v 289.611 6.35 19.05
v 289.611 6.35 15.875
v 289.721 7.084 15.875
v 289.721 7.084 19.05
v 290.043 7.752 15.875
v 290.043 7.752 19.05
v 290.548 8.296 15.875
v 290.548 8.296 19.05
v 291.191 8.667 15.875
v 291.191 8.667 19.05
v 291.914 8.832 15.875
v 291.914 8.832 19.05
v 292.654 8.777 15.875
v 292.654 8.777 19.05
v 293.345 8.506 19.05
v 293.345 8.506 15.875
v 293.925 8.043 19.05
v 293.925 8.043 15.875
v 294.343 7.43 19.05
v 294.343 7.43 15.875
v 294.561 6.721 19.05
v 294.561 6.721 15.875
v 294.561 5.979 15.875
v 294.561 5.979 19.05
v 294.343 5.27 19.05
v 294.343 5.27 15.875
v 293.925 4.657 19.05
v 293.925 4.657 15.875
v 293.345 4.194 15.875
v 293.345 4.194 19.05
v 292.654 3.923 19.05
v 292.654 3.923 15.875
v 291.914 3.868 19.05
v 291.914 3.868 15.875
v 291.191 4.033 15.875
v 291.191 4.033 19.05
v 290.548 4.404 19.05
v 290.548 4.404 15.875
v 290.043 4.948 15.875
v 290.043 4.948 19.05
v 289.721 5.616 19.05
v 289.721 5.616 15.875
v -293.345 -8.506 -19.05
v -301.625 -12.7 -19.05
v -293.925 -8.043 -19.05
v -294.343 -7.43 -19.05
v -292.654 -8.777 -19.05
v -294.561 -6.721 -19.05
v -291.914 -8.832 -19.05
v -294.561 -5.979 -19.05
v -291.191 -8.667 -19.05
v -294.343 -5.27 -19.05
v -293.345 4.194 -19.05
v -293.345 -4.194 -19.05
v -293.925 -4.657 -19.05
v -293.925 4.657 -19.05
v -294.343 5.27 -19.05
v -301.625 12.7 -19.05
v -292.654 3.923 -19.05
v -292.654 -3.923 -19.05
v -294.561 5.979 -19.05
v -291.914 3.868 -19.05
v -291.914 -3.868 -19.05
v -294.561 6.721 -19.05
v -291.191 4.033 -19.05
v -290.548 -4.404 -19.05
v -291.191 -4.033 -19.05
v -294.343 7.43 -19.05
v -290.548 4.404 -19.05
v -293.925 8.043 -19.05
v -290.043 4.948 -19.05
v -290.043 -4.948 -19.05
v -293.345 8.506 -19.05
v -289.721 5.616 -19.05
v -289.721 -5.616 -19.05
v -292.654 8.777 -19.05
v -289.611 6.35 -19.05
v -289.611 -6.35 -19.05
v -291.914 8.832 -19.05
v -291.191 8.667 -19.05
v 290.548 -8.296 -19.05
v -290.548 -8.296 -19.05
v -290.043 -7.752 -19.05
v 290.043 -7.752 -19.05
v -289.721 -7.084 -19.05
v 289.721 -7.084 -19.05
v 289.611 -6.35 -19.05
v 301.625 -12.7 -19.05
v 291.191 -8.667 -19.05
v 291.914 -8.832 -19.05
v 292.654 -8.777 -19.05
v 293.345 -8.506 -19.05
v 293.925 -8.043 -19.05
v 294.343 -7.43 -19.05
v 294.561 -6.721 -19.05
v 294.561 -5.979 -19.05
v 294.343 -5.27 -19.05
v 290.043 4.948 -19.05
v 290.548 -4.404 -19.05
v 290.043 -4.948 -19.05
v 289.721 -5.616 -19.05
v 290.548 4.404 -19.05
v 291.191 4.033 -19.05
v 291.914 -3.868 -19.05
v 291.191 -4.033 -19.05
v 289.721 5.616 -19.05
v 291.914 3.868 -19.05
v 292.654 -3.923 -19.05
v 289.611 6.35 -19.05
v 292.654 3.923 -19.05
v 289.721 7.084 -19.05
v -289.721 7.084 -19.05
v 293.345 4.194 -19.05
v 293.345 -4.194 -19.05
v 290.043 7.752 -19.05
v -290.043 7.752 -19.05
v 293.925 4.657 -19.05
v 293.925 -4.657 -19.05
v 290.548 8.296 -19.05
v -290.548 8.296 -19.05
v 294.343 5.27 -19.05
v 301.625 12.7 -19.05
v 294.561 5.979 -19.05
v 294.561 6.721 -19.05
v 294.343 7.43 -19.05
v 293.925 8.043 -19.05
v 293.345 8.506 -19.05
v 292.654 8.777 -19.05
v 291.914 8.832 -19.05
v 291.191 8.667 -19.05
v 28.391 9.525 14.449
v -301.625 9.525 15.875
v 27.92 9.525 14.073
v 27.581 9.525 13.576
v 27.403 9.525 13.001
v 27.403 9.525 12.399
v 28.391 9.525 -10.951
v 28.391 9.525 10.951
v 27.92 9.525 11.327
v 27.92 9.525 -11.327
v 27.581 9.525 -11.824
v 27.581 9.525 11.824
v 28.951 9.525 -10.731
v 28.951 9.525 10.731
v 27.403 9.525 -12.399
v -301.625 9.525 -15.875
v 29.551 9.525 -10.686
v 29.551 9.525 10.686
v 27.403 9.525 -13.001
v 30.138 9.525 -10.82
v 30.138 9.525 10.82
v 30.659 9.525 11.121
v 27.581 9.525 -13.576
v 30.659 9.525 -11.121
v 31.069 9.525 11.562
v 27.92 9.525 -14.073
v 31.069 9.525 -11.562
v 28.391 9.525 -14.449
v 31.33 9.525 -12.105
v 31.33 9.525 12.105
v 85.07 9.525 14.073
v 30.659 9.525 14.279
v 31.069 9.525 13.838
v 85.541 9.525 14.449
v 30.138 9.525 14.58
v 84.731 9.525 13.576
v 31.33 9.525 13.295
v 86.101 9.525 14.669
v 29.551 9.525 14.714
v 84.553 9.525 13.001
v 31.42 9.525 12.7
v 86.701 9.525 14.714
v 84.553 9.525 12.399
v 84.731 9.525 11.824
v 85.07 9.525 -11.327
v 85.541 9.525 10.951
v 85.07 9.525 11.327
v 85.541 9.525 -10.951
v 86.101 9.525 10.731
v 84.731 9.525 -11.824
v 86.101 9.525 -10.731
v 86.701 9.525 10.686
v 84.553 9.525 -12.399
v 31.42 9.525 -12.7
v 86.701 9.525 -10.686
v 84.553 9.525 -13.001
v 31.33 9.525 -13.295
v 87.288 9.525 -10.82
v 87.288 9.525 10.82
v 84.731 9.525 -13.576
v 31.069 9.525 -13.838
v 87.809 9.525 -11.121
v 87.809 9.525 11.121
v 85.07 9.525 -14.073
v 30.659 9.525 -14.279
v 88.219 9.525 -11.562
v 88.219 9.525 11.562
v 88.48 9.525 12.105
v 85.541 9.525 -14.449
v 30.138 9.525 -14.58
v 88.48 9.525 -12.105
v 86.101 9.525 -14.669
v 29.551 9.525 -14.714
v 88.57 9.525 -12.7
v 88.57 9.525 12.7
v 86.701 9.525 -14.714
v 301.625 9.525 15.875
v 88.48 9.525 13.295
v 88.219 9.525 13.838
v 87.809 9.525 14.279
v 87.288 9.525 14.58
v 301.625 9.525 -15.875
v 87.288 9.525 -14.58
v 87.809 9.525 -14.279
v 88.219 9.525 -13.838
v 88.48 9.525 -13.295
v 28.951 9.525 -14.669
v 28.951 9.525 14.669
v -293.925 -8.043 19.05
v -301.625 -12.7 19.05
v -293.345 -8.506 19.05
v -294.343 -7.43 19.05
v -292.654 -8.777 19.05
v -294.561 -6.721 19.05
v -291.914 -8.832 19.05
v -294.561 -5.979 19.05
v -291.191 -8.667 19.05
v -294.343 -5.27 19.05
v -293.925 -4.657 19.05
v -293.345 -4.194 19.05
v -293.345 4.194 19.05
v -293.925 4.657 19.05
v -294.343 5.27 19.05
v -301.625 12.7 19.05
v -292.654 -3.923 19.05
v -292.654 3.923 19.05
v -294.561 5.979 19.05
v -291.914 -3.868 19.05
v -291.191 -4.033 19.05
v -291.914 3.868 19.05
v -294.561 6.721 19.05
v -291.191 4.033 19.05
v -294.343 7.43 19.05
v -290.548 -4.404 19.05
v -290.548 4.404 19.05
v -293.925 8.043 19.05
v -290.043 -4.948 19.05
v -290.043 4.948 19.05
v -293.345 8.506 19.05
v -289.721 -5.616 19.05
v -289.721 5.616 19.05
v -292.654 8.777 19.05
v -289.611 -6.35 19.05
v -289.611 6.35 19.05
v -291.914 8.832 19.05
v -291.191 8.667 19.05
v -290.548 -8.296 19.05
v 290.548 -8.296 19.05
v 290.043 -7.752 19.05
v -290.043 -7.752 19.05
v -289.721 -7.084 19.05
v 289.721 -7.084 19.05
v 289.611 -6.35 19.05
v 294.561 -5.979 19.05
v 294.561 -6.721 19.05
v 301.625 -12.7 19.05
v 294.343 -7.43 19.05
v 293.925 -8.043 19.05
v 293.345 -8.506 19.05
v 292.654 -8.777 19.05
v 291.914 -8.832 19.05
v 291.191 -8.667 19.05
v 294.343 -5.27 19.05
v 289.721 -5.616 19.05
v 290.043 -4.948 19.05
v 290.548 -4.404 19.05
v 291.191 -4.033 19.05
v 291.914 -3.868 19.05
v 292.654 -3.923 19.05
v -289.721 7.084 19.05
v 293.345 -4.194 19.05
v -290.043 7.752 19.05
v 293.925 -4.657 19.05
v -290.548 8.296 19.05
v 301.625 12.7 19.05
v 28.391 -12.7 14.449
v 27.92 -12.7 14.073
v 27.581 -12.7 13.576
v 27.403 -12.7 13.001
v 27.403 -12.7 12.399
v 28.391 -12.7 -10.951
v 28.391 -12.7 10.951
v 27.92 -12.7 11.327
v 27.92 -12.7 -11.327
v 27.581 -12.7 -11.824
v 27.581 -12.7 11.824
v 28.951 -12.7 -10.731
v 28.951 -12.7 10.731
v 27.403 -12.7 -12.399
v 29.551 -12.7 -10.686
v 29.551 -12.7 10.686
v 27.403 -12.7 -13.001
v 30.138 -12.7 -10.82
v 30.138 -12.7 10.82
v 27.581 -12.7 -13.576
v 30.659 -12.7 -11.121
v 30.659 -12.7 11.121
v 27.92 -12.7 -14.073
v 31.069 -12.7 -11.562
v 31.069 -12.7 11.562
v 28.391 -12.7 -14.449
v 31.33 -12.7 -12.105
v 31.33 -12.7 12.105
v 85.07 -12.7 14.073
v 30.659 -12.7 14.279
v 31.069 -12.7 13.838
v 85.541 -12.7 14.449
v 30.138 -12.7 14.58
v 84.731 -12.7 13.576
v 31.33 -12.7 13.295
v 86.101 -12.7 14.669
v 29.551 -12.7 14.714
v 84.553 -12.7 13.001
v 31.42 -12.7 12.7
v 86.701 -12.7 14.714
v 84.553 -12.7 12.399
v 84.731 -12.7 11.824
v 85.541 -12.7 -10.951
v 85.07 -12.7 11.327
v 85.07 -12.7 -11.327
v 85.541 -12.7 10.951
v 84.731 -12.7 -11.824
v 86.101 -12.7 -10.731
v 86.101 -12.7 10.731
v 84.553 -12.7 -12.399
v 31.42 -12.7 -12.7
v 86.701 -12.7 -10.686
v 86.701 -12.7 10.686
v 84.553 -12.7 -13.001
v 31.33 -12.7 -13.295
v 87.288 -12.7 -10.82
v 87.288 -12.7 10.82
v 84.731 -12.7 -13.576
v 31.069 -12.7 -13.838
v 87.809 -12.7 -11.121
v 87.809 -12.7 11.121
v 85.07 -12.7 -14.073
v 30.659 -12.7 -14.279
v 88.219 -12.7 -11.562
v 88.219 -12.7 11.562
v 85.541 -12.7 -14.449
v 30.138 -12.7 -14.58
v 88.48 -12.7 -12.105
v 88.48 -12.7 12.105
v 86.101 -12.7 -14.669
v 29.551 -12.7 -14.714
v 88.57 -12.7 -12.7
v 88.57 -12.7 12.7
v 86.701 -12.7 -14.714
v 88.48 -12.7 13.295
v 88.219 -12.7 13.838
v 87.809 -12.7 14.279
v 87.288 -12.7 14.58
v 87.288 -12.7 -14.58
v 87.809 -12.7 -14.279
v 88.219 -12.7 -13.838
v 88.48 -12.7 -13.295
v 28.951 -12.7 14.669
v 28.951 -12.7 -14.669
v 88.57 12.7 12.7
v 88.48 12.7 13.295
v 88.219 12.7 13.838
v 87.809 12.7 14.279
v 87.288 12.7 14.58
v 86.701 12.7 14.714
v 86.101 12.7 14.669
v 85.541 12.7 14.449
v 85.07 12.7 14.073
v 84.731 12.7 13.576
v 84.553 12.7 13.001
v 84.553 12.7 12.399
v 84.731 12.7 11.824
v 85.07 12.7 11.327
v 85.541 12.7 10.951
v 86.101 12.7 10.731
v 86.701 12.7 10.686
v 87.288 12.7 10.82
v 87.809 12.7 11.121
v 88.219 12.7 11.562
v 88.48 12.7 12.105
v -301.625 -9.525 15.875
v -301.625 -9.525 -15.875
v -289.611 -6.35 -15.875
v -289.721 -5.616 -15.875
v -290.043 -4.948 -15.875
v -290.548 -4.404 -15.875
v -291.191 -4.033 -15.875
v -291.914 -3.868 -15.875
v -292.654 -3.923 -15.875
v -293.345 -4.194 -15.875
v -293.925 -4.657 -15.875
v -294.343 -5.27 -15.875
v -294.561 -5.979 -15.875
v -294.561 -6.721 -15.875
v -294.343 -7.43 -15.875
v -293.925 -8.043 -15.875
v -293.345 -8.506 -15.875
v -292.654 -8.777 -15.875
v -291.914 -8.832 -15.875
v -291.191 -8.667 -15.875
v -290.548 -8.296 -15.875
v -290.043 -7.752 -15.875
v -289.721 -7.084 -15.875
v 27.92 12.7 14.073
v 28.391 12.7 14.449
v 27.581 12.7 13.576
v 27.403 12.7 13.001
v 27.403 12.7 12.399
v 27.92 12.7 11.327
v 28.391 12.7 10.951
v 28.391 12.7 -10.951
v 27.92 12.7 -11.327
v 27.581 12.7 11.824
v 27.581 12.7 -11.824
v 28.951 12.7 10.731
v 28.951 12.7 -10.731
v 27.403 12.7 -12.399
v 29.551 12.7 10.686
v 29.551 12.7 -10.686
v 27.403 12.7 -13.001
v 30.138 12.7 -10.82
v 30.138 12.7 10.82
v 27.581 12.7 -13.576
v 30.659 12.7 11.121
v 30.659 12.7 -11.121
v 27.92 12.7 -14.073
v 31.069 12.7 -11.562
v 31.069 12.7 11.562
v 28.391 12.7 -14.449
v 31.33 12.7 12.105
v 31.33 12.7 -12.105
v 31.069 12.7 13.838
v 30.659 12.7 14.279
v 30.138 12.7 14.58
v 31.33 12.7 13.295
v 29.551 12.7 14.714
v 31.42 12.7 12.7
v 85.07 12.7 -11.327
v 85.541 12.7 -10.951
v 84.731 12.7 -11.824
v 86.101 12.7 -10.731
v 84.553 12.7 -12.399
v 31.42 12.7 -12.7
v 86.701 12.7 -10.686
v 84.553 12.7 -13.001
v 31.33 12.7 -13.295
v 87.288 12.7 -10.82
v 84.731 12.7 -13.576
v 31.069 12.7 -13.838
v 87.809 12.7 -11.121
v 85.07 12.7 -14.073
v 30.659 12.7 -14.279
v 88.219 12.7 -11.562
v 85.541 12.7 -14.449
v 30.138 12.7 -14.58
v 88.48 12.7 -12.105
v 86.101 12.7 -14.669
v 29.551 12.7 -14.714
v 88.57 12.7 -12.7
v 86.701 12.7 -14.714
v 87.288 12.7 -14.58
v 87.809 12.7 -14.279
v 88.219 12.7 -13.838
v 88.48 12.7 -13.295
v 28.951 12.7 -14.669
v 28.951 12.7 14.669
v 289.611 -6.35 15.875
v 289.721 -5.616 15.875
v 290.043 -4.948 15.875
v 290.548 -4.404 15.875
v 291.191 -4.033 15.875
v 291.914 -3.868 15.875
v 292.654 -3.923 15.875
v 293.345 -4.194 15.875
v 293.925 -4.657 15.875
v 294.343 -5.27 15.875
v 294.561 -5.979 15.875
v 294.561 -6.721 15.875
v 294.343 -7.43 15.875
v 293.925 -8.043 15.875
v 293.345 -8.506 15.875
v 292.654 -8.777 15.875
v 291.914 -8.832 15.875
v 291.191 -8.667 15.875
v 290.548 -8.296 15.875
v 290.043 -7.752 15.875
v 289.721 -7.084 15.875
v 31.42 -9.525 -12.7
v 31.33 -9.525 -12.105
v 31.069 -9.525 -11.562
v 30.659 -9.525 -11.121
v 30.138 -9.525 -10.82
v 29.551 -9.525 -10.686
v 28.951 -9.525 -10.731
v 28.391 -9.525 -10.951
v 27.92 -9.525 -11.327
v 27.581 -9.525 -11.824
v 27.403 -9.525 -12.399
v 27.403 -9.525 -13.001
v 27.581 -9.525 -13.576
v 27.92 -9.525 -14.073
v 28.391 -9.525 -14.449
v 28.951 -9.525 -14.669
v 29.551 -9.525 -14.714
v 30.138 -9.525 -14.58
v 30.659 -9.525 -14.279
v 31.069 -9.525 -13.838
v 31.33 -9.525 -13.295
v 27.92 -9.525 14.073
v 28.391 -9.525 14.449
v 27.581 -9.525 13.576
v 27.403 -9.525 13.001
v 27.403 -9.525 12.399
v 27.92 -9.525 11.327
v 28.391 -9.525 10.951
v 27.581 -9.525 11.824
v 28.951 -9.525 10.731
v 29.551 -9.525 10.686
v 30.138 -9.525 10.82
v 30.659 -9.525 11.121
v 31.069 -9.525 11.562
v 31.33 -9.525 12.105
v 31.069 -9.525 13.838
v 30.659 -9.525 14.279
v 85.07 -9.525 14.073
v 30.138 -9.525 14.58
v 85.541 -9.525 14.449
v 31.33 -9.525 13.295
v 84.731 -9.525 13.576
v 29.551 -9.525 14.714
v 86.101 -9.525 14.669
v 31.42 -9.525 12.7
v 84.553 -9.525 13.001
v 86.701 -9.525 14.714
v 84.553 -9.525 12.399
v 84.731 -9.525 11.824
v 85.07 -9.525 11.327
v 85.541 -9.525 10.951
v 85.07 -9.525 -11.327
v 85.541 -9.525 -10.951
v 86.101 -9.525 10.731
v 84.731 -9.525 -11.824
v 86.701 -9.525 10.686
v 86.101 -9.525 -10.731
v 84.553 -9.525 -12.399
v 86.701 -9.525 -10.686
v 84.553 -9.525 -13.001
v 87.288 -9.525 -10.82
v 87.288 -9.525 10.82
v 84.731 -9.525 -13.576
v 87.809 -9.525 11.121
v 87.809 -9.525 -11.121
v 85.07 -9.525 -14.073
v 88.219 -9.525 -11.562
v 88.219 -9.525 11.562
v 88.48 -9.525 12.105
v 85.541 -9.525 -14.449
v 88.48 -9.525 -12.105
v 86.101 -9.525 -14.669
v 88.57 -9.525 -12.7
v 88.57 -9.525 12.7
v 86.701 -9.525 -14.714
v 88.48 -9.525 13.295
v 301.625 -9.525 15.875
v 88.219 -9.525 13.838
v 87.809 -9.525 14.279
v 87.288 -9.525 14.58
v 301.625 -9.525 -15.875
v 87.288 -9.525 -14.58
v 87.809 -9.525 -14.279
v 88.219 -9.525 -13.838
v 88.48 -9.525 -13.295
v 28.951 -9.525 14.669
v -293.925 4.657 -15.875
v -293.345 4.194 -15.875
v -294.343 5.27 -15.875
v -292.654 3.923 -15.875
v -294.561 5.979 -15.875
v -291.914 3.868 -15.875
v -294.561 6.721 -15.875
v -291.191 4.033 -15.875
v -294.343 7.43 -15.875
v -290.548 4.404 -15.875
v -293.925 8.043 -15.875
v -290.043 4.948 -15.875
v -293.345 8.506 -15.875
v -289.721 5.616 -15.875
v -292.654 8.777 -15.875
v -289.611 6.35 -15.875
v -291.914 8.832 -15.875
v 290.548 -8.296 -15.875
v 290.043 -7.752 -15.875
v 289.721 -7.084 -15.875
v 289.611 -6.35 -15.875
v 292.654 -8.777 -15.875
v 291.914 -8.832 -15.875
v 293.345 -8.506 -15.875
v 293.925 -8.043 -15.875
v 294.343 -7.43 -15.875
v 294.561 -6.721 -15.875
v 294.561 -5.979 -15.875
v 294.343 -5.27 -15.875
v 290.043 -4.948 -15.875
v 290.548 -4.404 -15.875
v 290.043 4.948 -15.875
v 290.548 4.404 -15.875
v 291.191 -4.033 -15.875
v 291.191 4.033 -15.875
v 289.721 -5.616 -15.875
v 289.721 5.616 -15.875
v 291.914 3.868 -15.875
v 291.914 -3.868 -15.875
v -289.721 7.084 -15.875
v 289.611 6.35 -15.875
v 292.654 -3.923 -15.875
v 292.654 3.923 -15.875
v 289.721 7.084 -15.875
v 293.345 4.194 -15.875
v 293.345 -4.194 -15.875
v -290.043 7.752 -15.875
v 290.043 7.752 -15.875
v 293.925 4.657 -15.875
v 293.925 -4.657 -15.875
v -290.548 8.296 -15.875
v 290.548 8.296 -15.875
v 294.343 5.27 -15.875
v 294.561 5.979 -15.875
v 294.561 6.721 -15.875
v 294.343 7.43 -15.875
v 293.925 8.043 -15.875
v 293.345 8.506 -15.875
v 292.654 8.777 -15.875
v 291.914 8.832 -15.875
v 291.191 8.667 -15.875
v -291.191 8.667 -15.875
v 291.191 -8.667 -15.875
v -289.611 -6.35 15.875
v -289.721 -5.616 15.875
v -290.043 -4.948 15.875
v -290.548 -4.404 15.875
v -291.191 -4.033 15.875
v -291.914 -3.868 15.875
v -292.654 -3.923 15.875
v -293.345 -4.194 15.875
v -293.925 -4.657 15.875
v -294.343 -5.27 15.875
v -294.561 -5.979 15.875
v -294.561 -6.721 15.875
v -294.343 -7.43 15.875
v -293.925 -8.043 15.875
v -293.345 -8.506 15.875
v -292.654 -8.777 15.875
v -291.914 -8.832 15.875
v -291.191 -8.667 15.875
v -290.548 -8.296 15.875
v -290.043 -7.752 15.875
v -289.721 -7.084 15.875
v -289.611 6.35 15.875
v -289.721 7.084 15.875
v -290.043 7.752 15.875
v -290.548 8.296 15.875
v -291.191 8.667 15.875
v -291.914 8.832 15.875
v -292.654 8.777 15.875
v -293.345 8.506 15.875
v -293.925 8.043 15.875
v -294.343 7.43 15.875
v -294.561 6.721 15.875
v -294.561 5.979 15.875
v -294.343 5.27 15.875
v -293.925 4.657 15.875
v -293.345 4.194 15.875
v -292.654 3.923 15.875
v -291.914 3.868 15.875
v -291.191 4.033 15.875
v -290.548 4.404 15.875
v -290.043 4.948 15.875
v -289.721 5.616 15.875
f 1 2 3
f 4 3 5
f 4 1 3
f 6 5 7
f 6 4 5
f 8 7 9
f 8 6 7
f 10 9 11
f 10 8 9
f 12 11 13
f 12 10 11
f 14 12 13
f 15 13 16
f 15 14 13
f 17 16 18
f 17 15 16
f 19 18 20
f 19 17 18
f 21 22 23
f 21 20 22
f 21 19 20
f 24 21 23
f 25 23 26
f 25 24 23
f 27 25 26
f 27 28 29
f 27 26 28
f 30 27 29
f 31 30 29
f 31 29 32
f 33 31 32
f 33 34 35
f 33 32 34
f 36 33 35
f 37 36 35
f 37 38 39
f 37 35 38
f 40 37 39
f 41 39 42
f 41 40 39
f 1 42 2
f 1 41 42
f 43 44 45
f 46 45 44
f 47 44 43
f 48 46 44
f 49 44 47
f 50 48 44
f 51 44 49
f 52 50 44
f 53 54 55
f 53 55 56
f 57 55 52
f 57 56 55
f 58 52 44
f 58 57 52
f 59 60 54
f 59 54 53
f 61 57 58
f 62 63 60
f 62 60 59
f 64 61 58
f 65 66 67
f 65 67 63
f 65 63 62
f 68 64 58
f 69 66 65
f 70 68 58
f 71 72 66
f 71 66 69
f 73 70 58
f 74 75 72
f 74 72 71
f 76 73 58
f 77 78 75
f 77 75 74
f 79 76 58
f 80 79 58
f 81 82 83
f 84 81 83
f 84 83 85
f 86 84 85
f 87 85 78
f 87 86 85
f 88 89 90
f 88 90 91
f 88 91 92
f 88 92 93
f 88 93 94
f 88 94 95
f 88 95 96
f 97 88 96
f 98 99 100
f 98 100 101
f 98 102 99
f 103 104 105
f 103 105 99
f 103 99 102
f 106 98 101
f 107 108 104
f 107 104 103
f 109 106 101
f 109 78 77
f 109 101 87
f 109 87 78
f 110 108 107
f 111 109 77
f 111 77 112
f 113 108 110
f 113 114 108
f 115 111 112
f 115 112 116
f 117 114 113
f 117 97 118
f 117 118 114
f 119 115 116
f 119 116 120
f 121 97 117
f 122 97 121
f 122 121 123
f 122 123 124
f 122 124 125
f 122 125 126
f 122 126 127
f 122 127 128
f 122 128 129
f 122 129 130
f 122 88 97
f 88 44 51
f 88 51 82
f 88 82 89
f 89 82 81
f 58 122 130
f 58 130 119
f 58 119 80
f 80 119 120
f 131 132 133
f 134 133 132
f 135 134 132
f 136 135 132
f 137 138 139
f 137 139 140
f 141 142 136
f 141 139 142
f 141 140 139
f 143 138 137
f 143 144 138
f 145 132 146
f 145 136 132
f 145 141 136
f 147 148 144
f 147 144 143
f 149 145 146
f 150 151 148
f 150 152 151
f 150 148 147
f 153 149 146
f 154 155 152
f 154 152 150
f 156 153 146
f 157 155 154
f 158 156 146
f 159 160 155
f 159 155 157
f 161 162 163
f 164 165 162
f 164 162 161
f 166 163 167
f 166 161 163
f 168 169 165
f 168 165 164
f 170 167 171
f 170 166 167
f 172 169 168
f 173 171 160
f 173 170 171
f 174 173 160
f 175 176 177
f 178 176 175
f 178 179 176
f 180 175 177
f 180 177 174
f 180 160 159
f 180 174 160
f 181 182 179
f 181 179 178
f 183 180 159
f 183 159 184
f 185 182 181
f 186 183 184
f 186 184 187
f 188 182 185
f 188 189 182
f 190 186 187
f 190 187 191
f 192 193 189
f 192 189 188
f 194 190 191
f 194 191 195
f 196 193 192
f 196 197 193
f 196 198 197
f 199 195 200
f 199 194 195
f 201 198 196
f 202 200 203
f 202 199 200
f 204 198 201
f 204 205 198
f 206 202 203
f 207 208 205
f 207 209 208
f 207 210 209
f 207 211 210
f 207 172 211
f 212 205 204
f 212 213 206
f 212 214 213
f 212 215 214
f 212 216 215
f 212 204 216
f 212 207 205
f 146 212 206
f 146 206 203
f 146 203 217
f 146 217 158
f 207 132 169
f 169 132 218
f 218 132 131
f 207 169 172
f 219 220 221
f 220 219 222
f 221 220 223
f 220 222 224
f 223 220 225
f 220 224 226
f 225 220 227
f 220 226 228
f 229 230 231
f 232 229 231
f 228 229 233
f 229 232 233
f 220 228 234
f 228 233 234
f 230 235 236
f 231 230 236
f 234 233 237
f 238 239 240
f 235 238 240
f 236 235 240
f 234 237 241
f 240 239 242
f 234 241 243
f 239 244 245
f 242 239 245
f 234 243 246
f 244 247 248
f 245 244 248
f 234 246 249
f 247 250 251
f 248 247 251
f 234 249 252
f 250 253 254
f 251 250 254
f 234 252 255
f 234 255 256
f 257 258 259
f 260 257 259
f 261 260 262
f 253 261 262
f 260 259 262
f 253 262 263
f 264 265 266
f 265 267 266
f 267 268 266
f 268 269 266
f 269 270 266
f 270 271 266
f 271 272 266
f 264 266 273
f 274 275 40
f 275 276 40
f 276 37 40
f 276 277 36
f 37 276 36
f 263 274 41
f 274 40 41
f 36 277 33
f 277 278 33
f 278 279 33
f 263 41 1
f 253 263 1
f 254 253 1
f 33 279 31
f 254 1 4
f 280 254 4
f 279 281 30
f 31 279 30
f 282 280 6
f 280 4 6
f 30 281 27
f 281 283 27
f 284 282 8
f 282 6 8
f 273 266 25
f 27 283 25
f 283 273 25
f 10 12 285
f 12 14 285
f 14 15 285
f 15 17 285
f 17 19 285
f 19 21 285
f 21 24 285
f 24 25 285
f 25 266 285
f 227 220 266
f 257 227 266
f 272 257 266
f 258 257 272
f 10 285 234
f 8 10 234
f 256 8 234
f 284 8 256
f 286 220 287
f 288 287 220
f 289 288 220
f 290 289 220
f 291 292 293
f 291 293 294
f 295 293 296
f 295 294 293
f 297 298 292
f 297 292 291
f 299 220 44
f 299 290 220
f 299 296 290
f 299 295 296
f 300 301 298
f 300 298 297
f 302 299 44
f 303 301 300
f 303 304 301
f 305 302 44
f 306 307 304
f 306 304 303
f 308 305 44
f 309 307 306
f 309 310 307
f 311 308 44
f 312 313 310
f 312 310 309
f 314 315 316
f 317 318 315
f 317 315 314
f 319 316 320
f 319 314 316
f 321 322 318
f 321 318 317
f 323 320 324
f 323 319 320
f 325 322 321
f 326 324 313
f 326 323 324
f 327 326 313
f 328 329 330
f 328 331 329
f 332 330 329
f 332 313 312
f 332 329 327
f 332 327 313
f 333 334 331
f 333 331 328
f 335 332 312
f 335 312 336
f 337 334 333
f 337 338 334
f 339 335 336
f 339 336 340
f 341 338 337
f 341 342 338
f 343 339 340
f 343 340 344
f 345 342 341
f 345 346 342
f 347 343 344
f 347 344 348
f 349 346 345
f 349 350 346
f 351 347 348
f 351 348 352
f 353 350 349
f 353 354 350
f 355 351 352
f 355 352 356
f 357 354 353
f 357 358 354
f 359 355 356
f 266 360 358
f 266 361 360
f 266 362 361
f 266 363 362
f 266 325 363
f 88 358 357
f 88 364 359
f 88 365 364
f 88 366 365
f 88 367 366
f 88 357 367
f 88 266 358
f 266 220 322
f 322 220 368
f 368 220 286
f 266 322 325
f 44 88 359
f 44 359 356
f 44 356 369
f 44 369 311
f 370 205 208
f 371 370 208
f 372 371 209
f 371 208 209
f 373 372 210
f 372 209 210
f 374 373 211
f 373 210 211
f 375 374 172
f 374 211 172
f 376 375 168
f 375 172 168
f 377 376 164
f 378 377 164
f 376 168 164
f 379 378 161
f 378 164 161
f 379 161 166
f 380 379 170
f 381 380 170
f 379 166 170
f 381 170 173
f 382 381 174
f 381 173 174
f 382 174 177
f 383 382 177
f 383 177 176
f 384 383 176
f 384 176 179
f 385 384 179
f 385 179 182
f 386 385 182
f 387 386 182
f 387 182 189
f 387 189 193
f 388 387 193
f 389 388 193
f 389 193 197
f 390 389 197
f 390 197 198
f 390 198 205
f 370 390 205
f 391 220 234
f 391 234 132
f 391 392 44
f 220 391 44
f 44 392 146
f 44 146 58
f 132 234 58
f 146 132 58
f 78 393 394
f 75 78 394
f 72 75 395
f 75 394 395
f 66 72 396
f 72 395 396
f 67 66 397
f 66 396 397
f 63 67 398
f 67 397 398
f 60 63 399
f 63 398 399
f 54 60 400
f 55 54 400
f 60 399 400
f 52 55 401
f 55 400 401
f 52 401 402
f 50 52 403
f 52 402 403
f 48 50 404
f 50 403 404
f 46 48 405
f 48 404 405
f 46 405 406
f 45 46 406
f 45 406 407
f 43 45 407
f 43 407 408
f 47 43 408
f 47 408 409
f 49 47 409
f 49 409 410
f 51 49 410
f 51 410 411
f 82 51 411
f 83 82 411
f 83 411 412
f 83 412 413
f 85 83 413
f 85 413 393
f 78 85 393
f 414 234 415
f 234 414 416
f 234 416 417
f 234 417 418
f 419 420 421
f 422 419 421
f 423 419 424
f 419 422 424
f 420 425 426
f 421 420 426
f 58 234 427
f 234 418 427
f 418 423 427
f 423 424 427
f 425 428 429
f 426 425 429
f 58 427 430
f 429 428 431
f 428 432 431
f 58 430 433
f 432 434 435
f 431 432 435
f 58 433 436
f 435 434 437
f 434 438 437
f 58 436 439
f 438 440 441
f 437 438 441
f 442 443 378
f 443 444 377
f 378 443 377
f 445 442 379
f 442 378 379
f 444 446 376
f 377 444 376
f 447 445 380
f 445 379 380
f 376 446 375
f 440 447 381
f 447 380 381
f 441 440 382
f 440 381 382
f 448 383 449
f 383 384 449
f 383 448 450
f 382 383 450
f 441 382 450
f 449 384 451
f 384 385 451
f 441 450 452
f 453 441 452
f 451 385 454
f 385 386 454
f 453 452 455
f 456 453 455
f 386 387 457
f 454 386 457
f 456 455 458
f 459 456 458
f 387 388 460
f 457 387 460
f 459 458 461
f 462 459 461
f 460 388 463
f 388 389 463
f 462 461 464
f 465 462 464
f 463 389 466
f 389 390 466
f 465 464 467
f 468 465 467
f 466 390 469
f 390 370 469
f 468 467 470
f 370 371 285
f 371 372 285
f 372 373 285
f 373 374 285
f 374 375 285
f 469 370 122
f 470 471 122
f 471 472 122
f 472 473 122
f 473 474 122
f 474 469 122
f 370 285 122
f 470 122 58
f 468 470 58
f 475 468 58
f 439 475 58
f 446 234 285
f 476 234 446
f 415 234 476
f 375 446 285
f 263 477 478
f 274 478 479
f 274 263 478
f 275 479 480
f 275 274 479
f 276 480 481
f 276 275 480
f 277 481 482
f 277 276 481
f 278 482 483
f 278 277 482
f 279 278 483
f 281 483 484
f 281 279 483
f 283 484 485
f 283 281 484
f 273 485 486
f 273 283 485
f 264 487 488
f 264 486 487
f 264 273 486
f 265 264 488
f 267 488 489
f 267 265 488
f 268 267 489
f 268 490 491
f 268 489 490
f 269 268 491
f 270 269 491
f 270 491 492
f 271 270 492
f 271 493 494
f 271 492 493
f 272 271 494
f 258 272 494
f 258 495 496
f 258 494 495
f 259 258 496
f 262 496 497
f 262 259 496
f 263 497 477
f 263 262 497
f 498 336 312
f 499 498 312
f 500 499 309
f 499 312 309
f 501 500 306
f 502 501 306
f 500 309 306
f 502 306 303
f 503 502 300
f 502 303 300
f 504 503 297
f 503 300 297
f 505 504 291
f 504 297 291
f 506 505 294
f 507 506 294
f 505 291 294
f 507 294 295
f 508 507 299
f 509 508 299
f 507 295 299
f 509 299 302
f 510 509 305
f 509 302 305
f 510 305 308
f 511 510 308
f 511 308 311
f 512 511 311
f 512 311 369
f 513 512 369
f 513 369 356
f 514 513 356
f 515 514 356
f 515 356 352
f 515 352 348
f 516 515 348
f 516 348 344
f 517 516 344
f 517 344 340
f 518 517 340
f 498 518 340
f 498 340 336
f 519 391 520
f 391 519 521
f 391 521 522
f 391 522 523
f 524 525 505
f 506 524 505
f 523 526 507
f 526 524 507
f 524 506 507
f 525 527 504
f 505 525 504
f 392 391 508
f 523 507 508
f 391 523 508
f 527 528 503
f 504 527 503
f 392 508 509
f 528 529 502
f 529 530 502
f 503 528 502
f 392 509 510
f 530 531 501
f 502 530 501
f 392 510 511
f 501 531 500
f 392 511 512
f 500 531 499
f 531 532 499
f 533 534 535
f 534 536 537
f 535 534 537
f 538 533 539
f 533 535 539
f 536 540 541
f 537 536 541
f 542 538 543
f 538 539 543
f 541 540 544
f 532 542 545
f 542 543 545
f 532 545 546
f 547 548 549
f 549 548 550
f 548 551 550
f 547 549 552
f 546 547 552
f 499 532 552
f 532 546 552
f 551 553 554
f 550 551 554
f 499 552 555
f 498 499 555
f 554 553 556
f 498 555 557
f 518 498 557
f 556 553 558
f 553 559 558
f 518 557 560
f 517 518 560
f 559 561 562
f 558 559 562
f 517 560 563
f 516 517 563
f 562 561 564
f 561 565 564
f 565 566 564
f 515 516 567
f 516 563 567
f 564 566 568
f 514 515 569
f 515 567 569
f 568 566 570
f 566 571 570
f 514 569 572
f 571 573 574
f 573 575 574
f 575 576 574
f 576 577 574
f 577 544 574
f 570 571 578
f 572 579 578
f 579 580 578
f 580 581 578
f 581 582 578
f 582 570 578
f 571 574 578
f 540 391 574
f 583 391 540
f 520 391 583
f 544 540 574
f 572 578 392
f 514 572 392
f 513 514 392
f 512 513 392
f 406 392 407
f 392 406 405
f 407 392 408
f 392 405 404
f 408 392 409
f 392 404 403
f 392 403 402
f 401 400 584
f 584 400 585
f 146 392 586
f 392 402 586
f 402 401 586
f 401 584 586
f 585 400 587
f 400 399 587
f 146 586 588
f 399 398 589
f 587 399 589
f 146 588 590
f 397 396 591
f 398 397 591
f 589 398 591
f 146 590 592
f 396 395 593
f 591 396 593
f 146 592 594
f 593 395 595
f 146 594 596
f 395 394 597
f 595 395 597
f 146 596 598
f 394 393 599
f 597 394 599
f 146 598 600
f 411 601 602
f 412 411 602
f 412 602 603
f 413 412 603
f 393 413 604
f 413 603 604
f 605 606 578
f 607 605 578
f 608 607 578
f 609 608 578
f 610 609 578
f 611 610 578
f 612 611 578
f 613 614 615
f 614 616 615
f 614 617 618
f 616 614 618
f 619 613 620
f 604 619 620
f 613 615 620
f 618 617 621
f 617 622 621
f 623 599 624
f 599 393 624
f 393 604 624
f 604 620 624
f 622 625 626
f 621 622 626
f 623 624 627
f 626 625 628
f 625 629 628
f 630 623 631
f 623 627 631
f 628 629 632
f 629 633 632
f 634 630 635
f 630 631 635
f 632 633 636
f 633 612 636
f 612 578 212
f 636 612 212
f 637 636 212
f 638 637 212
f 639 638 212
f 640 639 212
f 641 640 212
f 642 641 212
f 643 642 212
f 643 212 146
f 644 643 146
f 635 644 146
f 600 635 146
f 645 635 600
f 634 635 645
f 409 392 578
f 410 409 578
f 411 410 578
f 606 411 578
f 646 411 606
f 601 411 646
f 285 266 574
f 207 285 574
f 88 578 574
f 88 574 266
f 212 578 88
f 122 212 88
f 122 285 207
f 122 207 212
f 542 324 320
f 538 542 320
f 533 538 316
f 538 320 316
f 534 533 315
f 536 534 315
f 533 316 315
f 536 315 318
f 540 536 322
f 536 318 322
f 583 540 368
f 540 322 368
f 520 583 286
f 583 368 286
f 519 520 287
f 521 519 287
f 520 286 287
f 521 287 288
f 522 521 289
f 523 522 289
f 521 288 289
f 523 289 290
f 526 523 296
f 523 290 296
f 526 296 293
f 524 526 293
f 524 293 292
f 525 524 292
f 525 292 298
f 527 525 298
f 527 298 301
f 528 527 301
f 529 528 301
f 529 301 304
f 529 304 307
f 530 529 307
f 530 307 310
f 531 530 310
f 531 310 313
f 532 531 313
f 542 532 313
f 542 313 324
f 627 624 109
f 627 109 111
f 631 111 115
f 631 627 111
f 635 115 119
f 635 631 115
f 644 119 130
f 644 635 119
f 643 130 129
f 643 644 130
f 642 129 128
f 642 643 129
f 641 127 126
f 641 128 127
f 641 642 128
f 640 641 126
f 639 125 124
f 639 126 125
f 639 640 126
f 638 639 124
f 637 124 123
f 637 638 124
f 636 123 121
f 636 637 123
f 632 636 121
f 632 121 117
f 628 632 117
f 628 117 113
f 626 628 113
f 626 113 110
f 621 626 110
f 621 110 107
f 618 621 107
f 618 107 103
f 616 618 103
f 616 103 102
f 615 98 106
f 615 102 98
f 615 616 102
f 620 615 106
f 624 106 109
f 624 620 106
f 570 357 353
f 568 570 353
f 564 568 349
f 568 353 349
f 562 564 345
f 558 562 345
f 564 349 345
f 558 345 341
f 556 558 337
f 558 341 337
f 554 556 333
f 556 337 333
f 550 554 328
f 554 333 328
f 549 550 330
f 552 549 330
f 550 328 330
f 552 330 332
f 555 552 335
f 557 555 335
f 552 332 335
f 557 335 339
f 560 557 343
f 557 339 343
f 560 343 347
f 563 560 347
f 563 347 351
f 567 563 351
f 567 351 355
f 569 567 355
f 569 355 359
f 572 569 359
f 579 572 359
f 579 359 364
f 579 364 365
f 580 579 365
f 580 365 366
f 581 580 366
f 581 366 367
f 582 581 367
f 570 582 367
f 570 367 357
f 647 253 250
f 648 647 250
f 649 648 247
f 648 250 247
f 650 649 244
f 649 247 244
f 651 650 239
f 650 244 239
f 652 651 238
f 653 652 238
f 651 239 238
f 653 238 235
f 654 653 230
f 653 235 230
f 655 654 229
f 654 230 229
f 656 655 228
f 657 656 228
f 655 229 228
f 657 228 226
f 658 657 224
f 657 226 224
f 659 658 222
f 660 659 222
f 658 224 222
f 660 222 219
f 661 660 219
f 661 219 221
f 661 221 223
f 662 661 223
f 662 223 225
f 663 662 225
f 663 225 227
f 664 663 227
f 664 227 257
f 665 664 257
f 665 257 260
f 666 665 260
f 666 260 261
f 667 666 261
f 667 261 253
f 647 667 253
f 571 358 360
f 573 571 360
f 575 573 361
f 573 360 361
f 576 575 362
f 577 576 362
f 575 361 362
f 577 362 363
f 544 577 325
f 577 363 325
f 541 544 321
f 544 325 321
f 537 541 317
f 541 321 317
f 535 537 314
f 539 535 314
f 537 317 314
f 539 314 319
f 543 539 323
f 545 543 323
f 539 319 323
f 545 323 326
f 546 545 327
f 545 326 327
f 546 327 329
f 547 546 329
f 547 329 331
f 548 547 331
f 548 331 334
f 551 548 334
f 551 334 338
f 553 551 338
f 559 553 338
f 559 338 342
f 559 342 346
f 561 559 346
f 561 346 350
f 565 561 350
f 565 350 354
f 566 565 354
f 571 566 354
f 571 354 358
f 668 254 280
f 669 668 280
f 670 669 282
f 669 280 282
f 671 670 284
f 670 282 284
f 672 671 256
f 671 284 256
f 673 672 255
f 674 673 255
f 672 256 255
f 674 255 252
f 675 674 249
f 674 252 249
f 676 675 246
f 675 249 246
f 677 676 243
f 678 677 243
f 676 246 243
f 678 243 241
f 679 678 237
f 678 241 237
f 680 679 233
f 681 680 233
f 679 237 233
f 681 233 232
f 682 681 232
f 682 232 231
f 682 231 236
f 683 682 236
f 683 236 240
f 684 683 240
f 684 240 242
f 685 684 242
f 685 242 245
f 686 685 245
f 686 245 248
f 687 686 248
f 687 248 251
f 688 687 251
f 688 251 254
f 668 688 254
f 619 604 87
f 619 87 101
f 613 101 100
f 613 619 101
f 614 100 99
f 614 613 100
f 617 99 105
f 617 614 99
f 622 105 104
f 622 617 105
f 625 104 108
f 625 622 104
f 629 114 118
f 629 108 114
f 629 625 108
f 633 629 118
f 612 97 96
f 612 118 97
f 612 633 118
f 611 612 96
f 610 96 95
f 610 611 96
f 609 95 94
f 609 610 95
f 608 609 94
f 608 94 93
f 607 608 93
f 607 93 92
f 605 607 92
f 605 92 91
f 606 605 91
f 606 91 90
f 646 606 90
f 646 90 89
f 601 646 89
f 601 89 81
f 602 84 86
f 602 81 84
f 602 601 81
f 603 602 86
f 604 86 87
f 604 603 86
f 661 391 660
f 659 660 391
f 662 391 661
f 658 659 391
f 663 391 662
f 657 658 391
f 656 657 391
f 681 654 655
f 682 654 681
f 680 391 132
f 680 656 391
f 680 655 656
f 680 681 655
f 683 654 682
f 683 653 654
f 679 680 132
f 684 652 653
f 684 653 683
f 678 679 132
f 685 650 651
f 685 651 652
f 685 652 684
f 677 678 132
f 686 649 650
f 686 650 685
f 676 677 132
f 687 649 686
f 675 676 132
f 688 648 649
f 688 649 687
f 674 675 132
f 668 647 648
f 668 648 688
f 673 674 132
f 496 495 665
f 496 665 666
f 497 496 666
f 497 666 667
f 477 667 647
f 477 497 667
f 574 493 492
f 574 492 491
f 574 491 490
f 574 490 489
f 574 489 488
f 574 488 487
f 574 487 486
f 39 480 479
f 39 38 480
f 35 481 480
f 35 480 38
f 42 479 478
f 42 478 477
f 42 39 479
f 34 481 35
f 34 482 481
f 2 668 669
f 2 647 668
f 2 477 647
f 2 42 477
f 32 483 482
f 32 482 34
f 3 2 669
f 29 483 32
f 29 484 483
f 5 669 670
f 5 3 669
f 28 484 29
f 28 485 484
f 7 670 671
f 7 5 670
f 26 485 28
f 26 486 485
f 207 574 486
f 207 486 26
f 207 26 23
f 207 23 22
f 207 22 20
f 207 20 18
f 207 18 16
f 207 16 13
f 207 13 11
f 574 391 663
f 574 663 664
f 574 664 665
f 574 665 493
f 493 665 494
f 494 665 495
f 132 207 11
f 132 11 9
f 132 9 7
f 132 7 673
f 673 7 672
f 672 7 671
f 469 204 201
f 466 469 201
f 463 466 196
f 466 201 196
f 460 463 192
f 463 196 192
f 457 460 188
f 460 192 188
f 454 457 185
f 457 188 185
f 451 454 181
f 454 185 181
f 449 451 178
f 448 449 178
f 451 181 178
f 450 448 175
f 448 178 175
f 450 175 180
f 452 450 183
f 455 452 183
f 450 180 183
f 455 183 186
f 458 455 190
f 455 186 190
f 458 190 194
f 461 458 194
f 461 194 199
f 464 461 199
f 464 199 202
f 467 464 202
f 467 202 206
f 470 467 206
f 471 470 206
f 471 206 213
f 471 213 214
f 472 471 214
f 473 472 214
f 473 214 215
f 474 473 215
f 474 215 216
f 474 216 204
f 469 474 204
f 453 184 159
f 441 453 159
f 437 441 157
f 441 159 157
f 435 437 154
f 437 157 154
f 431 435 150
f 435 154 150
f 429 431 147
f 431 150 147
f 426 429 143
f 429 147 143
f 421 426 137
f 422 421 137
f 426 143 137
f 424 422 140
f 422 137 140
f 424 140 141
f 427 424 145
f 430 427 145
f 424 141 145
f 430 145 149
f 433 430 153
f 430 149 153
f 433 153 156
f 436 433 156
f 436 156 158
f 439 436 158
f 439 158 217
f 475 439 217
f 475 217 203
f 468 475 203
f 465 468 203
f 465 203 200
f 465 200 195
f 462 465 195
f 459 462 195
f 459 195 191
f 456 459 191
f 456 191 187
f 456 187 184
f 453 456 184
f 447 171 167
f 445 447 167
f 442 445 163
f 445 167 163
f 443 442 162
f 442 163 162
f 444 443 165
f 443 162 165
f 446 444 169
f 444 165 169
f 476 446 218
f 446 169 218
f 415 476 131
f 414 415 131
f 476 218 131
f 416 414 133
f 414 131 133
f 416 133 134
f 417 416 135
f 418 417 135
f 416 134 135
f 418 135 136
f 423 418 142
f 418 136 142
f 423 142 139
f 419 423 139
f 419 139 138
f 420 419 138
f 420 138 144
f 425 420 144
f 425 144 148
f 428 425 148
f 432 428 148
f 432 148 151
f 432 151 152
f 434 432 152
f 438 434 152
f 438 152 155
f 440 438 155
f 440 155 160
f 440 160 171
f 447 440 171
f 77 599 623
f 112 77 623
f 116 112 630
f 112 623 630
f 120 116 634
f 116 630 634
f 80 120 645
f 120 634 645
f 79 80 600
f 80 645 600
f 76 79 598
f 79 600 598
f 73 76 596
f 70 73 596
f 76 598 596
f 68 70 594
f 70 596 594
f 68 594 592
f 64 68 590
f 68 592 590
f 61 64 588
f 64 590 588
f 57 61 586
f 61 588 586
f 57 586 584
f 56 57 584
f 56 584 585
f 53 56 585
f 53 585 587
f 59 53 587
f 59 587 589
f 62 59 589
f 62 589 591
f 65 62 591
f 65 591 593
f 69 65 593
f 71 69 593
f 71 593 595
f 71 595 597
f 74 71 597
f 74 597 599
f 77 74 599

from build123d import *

# Parameters (mm, degrees)
SKETCH1_W           = 38.1
SKETCH1_H           = 25.4
SKETCH1_W_2         = 31.75
SKETCH1_H_2         = 19.05
BOSS_EXTRUDE1_DEPTH = 301.625
SKETCH2_R           = 2.4892
CUT_EXTRUDE1_DEPTH  = 39.1
SKETCH4_R           = 2.0193
CUT_EXTRUDE2_DEPTH  = 26.4


with BuildPart() as part:
    # Sketch1 → Boss-Extrude1 (new body, symmetric)
    with BuildSketch(Plane(origin=(0, 0, 0), x_dir=(0, 0, -1), z_dir=(1, 0, 0))):
        Rectangle(SKETCH1_W, SKETCH1_H)
        Rectangle(SKETCH1_W_2, SKETCH1_H_2, mode=Mode.SUBTRACT)
    extrude(amount=BOSS_EXTRUDE1_DEPTH, both=True)

    # Sketch2 → Cut-Extrude1 (cut, through all)
    with BuildSketch(Plane.XY.offset(19.05)):
        with Locations((-292.1, 6.35)):
            Circle(SKETCH2_R)
        with Locations((-292.1, -6.35)):
            Circle(SKETCH2_R)
    cut_extrude1 = extrude(amount=-CUT_EXTRUDE1_DEPTH, mode=Mode.SUBTRACT)

    # Mirror1: Cut-Extrude1 across plane
    add(cut_extrude1.mirror(Plane(origin=(0, 0, 0), x_dir=(0, 0, 1), z_dir=(1, 0, 0))), mode=Mode.SUBTRACT)

    # Sketch4 → Cut-Extrude2 (cut, through all)
    with BuildSketch(Plane.XZ.offset(12.7)):
        with Locations((86.5502, -12.7)):
            Circle(SKETCH4_R)
        with Locations((86.5502, 12.7)):
            Circle(SKETCH4_R)
        with Locations((29.4002, 12.7)):
            Circle(SKETCH4_R)
        with Locations((29.4002, -12.7)):
            Circle(SKETCH4_R)
    extrude(amount=-CUT_EXTRUDE2_DEPTH, mode=Mode.SUBTRACT)


solid = part.part
